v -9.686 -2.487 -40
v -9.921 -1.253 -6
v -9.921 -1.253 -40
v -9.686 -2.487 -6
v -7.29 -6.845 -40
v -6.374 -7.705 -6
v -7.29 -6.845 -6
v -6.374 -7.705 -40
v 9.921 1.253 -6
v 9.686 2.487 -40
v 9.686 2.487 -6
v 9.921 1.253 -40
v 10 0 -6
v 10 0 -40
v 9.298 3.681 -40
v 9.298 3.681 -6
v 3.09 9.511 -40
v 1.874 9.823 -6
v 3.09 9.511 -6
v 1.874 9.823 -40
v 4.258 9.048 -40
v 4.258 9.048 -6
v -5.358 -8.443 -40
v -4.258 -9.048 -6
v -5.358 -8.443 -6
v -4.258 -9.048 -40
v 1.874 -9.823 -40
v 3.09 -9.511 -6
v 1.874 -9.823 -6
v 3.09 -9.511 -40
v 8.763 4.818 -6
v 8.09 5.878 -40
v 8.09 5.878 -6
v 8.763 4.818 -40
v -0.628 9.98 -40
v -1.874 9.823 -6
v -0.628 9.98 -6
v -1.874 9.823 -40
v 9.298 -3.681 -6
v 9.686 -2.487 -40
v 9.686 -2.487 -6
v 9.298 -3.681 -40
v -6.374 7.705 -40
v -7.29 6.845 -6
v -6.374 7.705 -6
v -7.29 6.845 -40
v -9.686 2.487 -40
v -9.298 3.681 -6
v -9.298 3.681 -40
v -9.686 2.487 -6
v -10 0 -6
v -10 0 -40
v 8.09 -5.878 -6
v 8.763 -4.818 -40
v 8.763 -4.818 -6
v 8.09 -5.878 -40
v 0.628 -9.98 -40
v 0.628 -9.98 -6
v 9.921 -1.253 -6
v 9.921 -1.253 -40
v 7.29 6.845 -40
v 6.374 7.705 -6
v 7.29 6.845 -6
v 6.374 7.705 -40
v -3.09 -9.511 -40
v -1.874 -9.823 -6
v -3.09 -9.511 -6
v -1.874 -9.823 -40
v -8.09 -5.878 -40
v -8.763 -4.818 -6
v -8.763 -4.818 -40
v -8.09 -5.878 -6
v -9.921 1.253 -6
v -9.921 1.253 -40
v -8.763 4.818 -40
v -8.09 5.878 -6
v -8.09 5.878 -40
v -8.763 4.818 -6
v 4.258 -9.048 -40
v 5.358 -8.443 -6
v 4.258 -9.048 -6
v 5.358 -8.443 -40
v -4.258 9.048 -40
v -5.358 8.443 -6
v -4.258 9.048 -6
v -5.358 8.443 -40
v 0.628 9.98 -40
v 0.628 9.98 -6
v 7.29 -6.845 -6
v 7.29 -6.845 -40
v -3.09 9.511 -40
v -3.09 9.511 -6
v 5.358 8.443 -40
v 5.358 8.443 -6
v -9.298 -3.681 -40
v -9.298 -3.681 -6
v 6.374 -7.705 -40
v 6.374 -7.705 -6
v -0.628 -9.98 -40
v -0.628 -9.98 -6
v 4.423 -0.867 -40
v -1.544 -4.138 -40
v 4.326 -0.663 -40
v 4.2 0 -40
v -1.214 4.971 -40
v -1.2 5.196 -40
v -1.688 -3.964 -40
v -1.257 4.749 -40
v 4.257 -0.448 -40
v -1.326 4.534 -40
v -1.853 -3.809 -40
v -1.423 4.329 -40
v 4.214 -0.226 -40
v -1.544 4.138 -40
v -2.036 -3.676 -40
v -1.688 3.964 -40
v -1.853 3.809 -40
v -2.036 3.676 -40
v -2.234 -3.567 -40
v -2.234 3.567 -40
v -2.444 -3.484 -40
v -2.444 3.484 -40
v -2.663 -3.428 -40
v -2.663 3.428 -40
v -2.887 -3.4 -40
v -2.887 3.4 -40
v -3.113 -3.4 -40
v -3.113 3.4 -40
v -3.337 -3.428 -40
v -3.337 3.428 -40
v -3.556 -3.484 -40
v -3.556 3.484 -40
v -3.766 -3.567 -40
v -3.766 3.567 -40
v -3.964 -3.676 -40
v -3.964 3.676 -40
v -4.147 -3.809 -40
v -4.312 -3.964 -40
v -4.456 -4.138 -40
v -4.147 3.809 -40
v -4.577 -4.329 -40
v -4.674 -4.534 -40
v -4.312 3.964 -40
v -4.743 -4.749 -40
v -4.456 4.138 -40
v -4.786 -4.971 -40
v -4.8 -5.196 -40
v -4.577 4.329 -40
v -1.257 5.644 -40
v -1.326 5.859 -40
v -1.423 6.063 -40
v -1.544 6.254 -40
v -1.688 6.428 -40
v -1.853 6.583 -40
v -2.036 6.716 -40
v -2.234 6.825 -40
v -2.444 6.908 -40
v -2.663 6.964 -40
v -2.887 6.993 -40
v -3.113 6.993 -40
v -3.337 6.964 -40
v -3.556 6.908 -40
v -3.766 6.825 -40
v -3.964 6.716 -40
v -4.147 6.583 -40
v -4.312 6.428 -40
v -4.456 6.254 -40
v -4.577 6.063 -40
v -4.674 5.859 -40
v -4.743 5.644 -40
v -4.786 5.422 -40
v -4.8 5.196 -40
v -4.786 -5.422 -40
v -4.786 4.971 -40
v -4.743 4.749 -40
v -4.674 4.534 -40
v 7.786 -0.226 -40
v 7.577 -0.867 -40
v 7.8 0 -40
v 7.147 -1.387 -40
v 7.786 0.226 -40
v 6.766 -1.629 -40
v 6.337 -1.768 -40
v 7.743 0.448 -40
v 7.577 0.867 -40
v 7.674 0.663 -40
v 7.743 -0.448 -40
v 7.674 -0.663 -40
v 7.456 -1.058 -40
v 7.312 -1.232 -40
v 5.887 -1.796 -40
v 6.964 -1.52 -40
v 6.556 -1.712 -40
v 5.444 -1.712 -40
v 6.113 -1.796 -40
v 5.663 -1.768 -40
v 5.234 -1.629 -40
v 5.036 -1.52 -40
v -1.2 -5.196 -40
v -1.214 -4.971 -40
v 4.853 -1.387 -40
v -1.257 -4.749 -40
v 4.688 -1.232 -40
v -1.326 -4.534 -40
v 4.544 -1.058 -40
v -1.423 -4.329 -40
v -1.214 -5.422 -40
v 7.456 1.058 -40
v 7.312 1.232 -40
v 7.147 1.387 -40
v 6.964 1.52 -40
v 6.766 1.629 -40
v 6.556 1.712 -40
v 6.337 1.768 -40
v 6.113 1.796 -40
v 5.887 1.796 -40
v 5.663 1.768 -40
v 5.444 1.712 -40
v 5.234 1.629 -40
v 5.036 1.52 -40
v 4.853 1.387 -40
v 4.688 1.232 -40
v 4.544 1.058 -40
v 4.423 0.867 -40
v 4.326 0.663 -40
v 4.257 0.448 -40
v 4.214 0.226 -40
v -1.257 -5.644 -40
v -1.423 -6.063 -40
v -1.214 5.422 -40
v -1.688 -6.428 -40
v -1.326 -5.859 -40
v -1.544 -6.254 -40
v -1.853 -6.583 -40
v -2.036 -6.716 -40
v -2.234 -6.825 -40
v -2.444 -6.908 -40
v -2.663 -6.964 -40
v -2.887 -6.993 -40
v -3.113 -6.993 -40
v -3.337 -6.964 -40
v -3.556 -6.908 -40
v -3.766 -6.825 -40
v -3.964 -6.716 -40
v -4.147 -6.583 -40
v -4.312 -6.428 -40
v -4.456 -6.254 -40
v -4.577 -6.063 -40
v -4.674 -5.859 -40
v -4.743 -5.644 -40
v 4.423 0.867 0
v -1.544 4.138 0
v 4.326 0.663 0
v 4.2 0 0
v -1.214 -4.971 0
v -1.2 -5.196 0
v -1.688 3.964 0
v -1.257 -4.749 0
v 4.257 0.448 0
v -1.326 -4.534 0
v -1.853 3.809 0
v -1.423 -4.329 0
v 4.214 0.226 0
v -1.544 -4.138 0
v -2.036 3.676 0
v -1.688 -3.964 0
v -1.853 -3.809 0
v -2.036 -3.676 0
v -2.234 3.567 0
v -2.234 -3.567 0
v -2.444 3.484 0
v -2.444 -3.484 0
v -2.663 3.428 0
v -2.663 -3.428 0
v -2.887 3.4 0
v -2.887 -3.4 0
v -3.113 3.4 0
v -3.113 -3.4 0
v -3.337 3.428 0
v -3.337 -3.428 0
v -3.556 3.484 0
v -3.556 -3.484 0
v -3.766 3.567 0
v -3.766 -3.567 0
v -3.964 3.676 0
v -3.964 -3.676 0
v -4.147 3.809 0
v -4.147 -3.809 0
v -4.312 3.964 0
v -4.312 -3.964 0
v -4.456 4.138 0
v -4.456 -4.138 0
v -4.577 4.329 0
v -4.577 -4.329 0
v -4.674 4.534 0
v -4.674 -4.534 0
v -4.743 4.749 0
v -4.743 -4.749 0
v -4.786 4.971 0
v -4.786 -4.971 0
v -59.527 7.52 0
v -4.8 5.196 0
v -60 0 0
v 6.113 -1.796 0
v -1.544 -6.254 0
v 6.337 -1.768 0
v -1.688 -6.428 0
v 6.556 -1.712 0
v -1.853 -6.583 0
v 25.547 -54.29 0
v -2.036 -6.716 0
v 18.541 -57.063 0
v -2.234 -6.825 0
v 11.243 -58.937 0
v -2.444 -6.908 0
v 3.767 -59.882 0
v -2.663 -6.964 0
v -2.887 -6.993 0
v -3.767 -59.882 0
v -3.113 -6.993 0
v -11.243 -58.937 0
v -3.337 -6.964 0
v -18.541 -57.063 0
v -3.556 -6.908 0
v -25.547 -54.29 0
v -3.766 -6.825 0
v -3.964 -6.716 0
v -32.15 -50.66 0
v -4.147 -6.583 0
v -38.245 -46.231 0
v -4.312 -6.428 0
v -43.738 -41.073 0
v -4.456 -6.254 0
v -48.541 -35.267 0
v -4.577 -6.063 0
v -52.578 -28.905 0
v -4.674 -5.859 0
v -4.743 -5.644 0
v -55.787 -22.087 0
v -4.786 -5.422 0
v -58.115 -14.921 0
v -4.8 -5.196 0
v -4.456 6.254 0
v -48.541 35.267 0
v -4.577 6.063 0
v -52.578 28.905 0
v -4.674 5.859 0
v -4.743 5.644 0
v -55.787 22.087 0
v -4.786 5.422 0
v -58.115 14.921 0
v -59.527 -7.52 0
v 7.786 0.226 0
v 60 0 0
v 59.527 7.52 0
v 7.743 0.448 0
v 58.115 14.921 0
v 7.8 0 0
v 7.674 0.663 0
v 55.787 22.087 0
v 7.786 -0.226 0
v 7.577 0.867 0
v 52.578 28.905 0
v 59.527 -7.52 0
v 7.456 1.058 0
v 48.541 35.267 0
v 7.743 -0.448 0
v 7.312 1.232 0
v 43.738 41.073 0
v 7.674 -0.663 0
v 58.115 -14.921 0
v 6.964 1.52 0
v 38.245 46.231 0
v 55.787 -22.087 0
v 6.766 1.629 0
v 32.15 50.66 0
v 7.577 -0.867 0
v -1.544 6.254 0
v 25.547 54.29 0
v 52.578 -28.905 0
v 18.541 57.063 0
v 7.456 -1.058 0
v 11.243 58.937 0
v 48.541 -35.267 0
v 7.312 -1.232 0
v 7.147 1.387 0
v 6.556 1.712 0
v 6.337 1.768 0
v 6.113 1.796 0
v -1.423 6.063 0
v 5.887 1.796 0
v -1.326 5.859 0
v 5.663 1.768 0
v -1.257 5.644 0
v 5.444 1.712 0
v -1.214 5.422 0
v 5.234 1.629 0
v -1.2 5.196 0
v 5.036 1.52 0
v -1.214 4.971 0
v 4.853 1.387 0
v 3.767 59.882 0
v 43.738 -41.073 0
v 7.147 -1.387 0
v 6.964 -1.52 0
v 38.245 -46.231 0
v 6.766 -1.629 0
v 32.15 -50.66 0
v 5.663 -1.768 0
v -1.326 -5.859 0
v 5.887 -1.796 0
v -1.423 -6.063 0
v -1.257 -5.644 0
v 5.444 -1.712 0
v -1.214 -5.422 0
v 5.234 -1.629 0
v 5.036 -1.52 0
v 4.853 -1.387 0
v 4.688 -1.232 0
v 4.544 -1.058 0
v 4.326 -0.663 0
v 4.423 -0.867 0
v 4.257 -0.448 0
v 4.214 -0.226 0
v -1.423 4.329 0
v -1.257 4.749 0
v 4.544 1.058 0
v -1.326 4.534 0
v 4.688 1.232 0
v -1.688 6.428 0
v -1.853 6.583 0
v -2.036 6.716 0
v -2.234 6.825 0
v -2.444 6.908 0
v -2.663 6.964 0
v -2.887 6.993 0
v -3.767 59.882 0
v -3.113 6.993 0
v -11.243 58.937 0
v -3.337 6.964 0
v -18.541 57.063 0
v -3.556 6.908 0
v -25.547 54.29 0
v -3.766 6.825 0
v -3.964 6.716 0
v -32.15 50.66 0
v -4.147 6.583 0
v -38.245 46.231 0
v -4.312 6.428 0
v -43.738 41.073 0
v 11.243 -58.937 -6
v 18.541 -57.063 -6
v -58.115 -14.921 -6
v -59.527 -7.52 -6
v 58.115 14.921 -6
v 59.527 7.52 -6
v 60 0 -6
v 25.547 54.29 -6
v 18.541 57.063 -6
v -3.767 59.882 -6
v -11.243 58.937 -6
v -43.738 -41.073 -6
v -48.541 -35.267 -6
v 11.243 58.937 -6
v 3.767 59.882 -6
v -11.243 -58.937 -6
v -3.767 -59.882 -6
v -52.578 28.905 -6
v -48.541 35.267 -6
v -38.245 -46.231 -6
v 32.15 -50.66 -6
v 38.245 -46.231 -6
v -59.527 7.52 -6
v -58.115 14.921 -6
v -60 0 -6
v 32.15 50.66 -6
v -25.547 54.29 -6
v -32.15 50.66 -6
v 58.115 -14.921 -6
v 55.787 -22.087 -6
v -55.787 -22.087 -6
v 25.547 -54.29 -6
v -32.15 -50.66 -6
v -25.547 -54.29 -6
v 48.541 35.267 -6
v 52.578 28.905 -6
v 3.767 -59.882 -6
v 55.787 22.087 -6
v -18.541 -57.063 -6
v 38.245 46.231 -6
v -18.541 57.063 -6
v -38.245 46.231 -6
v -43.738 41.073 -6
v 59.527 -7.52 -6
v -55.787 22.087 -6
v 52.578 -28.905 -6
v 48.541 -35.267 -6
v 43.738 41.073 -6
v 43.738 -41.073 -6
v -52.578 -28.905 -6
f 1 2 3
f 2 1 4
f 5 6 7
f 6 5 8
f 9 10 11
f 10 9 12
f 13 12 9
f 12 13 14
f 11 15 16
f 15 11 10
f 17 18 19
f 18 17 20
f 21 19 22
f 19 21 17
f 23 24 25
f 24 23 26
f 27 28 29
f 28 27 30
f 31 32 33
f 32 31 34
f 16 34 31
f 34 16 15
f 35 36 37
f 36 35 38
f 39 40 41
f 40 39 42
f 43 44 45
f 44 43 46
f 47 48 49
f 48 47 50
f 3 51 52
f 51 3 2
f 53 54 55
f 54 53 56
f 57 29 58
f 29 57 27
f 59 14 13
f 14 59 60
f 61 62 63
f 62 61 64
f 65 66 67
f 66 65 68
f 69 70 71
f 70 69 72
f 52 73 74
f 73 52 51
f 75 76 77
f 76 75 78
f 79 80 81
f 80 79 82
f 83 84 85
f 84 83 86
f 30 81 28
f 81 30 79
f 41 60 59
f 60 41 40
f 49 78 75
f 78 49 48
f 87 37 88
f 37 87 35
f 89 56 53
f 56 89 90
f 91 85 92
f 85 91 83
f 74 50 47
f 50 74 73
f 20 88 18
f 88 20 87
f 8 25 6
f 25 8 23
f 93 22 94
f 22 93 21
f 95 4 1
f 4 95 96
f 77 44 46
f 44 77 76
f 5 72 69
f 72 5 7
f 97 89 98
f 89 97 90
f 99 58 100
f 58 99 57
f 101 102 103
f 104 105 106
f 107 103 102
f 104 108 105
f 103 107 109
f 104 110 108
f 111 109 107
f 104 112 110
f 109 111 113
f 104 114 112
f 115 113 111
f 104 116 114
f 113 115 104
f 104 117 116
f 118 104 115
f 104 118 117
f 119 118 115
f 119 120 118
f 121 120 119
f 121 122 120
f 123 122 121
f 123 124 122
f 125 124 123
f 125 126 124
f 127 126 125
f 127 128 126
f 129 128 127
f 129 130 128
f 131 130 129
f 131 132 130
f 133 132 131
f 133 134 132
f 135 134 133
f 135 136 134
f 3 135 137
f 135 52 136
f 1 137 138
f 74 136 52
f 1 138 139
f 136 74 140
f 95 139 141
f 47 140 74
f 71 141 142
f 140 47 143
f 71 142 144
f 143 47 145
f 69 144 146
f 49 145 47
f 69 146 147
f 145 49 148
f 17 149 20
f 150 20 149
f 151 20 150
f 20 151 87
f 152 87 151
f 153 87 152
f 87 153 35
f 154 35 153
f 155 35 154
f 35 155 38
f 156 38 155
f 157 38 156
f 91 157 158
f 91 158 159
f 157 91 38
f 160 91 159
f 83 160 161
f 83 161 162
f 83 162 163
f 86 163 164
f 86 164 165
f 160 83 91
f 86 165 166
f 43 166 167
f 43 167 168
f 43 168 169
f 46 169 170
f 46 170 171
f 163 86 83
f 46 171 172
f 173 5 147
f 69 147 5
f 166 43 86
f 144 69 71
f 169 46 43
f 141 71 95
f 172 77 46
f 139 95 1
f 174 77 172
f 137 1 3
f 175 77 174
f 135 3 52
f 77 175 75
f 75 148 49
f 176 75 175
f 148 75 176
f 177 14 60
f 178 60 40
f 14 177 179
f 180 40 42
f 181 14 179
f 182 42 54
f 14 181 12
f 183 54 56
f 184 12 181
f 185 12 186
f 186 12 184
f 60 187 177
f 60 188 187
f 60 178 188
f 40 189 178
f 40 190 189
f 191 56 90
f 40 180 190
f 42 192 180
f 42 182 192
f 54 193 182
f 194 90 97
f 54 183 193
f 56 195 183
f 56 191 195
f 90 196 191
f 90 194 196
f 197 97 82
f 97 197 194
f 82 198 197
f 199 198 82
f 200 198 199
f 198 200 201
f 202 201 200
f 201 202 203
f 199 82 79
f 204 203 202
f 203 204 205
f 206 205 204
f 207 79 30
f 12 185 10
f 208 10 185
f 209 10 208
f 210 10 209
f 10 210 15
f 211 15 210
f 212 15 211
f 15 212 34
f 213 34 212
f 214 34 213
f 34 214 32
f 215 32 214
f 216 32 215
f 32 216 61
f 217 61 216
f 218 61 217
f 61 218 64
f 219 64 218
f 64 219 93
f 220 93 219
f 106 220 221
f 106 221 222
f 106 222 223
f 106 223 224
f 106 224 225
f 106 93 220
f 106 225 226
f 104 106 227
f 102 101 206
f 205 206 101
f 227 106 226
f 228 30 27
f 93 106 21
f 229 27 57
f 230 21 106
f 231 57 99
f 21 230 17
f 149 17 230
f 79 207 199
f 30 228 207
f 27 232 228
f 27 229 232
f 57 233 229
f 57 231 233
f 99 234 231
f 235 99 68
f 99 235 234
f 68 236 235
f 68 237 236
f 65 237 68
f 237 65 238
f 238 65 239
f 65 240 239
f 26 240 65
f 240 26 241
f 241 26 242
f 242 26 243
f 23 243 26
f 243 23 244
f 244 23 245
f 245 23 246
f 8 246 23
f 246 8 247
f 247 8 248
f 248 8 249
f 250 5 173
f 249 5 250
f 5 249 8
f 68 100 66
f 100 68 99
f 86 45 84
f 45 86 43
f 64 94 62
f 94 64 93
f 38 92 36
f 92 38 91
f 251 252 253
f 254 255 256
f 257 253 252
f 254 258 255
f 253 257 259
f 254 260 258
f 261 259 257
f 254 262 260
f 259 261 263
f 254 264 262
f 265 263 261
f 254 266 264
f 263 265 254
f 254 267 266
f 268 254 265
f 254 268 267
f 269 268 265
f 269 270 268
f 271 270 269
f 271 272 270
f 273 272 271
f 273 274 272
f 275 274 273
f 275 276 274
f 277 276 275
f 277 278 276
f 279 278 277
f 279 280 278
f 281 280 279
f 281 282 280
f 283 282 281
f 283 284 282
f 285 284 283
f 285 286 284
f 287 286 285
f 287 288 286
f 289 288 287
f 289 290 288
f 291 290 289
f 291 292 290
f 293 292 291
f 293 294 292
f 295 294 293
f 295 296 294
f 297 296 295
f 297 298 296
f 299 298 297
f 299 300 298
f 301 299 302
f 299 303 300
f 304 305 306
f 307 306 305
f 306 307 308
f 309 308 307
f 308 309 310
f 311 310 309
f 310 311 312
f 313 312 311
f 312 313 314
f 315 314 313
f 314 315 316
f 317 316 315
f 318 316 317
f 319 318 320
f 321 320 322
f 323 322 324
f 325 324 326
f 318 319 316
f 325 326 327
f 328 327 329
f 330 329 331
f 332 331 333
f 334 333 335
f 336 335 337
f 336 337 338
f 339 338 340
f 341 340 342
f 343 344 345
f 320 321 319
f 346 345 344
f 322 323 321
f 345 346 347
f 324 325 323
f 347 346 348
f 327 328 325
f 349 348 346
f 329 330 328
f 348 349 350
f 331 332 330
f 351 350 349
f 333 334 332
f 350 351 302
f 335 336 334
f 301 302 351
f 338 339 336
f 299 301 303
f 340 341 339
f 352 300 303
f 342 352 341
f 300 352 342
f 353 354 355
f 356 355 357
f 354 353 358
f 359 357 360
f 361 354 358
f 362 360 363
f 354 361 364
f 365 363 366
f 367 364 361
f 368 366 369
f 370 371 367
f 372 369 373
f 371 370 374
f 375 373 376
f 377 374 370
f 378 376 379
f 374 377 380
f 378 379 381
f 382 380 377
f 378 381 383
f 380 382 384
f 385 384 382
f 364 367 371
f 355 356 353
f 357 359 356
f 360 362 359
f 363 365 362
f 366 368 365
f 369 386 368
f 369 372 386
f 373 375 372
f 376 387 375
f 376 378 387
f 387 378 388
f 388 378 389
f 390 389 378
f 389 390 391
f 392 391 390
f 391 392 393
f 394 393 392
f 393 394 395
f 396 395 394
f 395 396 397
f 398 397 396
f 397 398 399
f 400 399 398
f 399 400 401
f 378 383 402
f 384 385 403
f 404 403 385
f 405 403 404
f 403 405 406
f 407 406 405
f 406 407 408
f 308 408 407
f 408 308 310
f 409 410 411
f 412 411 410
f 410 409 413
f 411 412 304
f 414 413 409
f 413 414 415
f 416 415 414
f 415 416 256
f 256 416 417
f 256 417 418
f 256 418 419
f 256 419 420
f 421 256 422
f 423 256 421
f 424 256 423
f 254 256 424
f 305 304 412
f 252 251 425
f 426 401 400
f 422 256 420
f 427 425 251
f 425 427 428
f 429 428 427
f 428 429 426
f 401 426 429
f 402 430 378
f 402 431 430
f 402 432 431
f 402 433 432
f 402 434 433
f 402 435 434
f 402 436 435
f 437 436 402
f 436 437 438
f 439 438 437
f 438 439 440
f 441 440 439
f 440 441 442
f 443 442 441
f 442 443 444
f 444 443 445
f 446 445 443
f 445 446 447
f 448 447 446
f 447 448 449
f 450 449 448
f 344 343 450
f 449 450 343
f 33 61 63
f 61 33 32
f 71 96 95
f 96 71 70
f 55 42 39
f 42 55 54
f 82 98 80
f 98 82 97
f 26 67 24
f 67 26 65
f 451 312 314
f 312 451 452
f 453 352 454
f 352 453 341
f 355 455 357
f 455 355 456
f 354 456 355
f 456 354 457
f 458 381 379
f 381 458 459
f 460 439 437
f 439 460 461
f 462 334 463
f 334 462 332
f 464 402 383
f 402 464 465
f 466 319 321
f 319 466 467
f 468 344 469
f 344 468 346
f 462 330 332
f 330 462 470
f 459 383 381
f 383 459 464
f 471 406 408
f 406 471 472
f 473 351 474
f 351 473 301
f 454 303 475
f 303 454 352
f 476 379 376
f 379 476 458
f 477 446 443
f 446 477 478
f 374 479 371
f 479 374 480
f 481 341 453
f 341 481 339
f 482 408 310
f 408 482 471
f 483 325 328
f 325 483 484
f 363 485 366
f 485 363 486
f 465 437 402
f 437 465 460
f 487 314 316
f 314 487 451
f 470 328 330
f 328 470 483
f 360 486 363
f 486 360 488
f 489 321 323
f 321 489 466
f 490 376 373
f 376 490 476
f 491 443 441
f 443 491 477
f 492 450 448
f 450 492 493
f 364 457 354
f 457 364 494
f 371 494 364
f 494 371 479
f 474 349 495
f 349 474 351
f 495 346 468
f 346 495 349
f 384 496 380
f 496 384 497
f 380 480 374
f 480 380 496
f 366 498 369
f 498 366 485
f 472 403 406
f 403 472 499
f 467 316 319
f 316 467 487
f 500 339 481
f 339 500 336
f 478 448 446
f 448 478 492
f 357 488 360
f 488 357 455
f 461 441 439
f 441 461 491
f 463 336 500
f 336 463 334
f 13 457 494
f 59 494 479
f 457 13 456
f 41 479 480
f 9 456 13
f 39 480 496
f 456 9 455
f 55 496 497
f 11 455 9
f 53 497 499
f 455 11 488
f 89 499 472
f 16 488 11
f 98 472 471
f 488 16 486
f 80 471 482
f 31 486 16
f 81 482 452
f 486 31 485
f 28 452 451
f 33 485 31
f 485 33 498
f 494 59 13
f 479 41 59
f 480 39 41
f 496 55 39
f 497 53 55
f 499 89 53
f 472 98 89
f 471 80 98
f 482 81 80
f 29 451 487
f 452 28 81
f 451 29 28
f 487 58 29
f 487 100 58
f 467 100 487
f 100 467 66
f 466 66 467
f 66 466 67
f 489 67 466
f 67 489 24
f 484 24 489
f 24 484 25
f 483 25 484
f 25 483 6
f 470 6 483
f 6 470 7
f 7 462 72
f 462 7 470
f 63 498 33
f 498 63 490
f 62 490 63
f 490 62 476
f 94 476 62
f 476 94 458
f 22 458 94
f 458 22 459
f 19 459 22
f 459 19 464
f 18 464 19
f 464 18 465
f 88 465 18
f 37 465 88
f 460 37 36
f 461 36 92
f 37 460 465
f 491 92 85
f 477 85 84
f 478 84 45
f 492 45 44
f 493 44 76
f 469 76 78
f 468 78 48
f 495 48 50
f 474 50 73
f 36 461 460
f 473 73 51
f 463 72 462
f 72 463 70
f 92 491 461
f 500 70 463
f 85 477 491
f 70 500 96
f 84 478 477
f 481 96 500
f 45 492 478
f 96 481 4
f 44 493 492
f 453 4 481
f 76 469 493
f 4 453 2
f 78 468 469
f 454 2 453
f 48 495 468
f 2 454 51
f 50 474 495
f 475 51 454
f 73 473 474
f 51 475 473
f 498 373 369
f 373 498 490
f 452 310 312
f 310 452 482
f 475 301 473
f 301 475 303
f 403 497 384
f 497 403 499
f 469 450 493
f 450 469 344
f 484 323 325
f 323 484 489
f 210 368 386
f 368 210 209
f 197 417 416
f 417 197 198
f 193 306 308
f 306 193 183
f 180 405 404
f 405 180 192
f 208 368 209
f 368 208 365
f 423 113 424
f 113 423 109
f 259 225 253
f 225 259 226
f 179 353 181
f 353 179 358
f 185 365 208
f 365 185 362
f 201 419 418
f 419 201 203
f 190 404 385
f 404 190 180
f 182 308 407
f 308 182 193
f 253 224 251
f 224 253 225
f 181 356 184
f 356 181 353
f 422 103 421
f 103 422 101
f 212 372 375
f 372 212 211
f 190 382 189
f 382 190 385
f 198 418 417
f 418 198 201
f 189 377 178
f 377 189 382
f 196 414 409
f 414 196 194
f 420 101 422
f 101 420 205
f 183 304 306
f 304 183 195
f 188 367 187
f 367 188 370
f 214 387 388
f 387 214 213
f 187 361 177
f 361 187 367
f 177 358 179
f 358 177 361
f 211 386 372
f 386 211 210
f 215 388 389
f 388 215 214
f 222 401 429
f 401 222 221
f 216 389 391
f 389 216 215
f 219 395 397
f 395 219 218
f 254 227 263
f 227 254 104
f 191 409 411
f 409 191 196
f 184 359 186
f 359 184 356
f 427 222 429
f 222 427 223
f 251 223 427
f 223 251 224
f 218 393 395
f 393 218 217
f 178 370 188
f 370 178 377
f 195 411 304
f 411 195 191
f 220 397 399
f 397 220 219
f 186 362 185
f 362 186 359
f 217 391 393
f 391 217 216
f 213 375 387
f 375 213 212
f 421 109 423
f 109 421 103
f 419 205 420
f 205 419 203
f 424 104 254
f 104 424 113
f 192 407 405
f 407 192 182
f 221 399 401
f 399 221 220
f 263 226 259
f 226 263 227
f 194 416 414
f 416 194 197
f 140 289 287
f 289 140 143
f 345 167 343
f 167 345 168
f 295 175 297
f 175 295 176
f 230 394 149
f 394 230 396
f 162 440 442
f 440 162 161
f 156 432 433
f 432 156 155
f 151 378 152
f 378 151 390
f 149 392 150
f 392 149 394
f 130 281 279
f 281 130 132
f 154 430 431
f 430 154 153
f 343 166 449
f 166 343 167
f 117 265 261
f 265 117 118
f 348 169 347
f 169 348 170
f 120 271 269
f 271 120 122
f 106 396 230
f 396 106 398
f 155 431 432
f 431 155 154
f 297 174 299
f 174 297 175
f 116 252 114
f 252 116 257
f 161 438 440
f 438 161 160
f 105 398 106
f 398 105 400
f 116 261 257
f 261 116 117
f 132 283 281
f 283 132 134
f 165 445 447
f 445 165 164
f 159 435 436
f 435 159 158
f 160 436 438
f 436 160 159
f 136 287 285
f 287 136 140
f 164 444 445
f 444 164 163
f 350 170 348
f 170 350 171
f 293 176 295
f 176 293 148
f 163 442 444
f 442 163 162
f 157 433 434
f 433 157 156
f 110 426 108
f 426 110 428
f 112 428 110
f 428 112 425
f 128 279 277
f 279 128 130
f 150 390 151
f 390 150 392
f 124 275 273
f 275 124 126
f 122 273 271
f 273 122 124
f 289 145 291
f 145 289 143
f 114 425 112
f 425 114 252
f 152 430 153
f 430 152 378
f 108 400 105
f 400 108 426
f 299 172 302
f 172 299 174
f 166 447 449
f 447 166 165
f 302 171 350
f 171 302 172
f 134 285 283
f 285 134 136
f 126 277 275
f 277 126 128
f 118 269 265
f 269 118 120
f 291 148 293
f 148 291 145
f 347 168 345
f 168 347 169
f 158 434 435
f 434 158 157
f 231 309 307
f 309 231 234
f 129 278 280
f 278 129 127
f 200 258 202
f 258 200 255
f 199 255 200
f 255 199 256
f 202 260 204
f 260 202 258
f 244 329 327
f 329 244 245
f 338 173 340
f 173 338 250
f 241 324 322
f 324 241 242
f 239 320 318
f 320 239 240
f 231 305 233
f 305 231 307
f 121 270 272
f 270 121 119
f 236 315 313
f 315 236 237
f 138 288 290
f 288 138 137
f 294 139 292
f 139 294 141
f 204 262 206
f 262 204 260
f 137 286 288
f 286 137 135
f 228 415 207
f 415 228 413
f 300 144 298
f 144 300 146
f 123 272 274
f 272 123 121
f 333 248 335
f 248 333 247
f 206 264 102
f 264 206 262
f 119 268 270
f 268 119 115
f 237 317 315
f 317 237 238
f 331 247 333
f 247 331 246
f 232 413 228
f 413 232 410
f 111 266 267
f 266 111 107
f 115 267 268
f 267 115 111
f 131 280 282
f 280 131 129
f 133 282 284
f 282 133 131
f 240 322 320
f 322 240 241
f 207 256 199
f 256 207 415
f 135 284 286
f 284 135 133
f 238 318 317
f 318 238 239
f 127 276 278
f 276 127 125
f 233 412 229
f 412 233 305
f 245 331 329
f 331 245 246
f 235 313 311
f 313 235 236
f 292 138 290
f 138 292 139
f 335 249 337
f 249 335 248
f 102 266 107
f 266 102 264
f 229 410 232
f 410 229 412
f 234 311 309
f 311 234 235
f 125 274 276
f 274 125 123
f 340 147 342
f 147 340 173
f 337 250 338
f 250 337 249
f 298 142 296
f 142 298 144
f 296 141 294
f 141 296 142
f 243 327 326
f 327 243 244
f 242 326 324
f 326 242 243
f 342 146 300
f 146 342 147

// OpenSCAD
$fn = 50;


difference() {
	union() {
		translate(v = [0, 0, -40.0000000000]) {
			cylinder(h = 40, r = 10.0000000000);
		}
		translate(v = [0, 0, -6.0000000000]) {
			cylinder(h = 6, r = 60.0000000000);
		}
	}
	union() {
		#translate(v = [6.0000000000, 0.0000000000, -40]) {
			cylinder(h = 40, r = 1.8000000000);
		}
		#translate(v = [-3.0000000000, 5.1961524227, -40]) {
			cylinder(h = 40, r = 1.8000000000);
		}
		#translate(v = [-3.0000000000, -5.1961524227, -40]) {
			cylinder(h = 40, r = 1.8000000000);
		}
	}
}
